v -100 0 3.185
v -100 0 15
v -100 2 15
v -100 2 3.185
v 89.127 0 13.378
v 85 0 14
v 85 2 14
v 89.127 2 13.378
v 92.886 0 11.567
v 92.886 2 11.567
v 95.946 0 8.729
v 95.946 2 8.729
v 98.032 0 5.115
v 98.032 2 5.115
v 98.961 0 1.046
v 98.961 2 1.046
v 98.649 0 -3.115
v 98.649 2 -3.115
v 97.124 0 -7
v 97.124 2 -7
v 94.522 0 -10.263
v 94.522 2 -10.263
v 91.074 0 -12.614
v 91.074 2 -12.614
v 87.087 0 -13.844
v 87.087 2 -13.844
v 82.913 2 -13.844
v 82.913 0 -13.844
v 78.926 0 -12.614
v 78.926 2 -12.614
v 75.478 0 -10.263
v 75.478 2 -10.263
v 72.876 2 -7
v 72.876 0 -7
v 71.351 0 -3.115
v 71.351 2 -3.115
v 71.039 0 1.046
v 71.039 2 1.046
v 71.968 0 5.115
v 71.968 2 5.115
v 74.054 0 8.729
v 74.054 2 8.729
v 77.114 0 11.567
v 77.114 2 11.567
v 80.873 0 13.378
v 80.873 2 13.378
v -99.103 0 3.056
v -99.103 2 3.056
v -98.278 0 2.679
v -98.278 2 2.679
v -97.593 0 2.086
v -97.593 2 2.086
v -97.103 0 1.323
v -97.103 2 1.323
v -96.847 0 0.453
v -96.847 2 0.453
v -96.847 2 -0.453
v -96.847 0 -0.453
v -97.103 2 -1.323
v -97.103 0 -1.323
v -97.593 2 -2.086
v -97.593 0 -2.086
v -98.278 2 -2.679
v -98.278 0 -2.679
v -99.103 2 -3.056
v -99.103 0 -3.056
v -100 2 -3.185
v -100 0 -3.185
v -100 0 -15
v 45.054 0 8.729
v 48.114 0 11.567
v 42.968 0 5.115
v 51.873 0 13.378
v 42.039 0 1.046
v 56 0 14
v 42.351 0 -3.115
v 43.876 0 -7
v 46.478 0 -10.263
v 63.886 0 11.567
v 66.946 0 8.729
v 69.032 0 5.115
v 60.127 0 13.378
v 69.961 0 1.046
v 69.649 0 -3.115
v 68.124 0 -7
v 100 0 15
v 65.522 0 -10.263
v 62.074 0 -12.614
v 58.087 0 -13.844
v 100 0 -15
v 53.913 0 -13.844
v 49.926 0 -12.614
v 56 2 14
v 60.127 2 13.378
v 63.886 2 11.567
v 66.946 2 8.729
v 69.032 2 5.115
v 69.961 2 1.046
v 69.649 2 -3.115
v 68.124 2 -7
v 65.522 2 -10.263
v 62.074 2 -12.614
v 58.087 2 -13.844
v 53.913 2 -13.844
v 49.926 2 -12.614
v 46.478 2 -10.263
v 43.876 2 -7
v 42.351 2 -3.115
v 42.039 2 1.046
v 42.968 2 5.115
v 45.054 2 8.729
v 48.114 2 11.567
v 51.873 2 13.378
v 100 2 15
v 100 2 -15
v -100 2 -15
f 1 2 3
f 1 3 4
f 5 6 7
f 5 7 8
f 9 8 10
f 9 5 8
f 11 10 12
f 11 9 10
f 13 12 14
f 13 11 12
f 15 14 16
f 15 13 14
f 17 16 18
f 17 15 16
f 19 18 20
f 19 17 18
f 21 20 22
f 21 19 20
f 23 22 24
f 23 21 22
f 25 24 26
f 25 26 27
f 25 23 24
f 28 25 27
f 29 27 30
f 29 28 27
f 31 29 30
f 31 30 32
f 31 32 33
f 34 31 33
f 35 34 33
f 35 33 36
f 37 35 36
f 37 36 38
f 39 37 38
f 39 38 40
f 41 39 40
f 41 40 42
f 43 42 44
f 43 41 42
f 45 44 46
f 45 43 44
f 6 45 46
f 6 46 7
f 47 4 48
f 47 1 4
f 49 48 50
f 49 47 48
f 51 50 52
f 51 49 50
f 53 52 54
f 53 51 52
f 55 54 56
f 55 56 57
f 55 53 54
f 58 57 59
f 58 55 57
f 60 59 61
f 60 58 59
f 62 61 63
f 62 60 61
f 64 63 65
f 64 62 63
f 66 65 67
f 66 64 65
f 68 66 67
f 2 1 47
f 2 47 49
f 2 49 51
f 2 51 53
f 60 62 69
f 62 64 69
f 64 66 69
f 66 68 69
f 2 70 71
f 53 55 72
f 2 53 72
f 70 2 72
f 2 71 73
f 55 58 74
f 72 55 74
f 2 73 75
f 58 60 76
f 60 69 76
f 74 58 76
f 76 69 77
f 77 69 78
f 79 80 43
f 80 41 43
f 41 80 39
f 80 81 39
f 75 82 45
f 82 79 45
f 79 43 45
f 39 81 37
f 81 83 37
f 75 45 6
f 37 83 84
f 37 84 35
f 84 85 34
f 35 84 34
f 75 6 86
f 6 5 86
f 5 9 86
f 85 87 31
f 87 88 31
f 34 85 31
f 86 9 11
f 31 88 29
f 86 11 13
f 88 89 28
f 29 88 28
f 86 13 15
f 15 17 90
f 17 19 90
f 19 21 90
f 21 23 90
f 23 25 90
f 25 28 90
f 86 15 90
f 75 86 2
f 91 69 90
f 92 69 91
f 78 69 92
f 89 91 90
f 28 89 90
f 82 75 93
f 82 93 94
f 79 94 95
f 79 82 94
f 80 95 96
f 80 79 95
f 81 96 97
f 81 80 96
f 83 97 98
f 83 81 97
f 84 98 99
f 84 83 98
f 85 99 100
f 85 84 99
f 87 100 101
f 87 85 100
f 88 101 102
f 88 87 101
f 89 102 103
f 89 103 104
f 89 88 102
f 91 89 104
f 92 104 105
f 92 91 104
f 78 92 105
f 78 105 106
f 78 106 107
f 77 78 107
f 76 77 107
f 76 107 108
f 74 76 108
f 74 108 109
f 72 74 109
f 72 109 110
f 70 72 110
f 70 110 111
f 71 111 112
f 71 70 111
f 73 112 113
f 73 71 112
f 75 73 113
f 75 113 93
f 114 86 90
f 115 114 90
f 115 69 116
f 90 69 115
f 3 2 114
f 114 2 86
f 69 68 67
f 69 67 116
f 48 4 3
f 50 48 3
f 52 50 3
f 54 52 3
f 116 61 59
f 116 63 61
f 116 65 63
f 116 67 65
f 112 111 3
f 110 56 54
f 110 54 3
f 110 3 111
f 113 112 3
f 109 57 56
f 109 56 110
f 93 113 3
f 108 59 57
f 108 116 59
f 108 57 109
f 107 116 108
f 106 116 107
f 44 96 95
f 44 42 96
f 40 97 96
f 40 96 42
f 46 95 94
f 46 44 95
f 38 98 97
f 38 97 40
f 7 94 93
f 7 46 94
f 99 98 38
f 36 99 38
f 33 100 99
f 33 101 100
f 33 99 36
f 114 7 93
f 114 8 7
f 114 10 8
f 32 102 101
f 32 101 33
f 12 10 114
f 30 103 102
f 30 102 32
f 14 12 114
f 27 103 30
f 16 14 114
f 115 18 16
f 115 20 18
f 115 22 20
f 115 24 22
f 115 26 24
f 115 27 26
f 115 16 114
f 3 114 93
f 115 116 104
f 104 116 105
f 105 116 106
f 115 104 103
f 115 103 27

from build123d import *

# Parameters (mm, degrees)
SKETCH1_W           = 200
SKETCH1_H           = 30
SKETCH1_R           = 14
BOSS_EXTRUDE3_DEPTH = 2
SKETCH1_7_R         = 3.185
CUT_EXTRUDE1_DEPTH  = 10


with BuildPart() as part:
    # Sketch1 → Boss-Extrude3 (new body)
    with BuildSketch(Plane(origin=(0, 0, 0), x_dir=(1, 0, 0), z_dir=(0, 1, 0))):
        Rectangle(SKETCH1_W, SKETCH1_H)
        with Locations((85, 0)):
            Circle(SKETCH1_R, mode=Mode.SUBTRACT)
        with Locations((56, 0)):
            Circle(SKETCH1_R, mode=Mode.SUBTRACT)
    extrude(amount=BOSS_EXTRUDE3_DEPTH)

    # Sketch1<7> → Cut-Extrude1 (cut)
    with BuildSketch(Plane(origin=(0, 0, 0), x_dir=(1, 0, 0), z_dir=(0, 1, 0))):
        with Locations((-100, 0)):
            Circle(SKETCH1_7_R)
    extrude(amount=CUT_EXTRUDE1_DEPTH, mode=Mode.SUBTRACT)


solid = part.part
